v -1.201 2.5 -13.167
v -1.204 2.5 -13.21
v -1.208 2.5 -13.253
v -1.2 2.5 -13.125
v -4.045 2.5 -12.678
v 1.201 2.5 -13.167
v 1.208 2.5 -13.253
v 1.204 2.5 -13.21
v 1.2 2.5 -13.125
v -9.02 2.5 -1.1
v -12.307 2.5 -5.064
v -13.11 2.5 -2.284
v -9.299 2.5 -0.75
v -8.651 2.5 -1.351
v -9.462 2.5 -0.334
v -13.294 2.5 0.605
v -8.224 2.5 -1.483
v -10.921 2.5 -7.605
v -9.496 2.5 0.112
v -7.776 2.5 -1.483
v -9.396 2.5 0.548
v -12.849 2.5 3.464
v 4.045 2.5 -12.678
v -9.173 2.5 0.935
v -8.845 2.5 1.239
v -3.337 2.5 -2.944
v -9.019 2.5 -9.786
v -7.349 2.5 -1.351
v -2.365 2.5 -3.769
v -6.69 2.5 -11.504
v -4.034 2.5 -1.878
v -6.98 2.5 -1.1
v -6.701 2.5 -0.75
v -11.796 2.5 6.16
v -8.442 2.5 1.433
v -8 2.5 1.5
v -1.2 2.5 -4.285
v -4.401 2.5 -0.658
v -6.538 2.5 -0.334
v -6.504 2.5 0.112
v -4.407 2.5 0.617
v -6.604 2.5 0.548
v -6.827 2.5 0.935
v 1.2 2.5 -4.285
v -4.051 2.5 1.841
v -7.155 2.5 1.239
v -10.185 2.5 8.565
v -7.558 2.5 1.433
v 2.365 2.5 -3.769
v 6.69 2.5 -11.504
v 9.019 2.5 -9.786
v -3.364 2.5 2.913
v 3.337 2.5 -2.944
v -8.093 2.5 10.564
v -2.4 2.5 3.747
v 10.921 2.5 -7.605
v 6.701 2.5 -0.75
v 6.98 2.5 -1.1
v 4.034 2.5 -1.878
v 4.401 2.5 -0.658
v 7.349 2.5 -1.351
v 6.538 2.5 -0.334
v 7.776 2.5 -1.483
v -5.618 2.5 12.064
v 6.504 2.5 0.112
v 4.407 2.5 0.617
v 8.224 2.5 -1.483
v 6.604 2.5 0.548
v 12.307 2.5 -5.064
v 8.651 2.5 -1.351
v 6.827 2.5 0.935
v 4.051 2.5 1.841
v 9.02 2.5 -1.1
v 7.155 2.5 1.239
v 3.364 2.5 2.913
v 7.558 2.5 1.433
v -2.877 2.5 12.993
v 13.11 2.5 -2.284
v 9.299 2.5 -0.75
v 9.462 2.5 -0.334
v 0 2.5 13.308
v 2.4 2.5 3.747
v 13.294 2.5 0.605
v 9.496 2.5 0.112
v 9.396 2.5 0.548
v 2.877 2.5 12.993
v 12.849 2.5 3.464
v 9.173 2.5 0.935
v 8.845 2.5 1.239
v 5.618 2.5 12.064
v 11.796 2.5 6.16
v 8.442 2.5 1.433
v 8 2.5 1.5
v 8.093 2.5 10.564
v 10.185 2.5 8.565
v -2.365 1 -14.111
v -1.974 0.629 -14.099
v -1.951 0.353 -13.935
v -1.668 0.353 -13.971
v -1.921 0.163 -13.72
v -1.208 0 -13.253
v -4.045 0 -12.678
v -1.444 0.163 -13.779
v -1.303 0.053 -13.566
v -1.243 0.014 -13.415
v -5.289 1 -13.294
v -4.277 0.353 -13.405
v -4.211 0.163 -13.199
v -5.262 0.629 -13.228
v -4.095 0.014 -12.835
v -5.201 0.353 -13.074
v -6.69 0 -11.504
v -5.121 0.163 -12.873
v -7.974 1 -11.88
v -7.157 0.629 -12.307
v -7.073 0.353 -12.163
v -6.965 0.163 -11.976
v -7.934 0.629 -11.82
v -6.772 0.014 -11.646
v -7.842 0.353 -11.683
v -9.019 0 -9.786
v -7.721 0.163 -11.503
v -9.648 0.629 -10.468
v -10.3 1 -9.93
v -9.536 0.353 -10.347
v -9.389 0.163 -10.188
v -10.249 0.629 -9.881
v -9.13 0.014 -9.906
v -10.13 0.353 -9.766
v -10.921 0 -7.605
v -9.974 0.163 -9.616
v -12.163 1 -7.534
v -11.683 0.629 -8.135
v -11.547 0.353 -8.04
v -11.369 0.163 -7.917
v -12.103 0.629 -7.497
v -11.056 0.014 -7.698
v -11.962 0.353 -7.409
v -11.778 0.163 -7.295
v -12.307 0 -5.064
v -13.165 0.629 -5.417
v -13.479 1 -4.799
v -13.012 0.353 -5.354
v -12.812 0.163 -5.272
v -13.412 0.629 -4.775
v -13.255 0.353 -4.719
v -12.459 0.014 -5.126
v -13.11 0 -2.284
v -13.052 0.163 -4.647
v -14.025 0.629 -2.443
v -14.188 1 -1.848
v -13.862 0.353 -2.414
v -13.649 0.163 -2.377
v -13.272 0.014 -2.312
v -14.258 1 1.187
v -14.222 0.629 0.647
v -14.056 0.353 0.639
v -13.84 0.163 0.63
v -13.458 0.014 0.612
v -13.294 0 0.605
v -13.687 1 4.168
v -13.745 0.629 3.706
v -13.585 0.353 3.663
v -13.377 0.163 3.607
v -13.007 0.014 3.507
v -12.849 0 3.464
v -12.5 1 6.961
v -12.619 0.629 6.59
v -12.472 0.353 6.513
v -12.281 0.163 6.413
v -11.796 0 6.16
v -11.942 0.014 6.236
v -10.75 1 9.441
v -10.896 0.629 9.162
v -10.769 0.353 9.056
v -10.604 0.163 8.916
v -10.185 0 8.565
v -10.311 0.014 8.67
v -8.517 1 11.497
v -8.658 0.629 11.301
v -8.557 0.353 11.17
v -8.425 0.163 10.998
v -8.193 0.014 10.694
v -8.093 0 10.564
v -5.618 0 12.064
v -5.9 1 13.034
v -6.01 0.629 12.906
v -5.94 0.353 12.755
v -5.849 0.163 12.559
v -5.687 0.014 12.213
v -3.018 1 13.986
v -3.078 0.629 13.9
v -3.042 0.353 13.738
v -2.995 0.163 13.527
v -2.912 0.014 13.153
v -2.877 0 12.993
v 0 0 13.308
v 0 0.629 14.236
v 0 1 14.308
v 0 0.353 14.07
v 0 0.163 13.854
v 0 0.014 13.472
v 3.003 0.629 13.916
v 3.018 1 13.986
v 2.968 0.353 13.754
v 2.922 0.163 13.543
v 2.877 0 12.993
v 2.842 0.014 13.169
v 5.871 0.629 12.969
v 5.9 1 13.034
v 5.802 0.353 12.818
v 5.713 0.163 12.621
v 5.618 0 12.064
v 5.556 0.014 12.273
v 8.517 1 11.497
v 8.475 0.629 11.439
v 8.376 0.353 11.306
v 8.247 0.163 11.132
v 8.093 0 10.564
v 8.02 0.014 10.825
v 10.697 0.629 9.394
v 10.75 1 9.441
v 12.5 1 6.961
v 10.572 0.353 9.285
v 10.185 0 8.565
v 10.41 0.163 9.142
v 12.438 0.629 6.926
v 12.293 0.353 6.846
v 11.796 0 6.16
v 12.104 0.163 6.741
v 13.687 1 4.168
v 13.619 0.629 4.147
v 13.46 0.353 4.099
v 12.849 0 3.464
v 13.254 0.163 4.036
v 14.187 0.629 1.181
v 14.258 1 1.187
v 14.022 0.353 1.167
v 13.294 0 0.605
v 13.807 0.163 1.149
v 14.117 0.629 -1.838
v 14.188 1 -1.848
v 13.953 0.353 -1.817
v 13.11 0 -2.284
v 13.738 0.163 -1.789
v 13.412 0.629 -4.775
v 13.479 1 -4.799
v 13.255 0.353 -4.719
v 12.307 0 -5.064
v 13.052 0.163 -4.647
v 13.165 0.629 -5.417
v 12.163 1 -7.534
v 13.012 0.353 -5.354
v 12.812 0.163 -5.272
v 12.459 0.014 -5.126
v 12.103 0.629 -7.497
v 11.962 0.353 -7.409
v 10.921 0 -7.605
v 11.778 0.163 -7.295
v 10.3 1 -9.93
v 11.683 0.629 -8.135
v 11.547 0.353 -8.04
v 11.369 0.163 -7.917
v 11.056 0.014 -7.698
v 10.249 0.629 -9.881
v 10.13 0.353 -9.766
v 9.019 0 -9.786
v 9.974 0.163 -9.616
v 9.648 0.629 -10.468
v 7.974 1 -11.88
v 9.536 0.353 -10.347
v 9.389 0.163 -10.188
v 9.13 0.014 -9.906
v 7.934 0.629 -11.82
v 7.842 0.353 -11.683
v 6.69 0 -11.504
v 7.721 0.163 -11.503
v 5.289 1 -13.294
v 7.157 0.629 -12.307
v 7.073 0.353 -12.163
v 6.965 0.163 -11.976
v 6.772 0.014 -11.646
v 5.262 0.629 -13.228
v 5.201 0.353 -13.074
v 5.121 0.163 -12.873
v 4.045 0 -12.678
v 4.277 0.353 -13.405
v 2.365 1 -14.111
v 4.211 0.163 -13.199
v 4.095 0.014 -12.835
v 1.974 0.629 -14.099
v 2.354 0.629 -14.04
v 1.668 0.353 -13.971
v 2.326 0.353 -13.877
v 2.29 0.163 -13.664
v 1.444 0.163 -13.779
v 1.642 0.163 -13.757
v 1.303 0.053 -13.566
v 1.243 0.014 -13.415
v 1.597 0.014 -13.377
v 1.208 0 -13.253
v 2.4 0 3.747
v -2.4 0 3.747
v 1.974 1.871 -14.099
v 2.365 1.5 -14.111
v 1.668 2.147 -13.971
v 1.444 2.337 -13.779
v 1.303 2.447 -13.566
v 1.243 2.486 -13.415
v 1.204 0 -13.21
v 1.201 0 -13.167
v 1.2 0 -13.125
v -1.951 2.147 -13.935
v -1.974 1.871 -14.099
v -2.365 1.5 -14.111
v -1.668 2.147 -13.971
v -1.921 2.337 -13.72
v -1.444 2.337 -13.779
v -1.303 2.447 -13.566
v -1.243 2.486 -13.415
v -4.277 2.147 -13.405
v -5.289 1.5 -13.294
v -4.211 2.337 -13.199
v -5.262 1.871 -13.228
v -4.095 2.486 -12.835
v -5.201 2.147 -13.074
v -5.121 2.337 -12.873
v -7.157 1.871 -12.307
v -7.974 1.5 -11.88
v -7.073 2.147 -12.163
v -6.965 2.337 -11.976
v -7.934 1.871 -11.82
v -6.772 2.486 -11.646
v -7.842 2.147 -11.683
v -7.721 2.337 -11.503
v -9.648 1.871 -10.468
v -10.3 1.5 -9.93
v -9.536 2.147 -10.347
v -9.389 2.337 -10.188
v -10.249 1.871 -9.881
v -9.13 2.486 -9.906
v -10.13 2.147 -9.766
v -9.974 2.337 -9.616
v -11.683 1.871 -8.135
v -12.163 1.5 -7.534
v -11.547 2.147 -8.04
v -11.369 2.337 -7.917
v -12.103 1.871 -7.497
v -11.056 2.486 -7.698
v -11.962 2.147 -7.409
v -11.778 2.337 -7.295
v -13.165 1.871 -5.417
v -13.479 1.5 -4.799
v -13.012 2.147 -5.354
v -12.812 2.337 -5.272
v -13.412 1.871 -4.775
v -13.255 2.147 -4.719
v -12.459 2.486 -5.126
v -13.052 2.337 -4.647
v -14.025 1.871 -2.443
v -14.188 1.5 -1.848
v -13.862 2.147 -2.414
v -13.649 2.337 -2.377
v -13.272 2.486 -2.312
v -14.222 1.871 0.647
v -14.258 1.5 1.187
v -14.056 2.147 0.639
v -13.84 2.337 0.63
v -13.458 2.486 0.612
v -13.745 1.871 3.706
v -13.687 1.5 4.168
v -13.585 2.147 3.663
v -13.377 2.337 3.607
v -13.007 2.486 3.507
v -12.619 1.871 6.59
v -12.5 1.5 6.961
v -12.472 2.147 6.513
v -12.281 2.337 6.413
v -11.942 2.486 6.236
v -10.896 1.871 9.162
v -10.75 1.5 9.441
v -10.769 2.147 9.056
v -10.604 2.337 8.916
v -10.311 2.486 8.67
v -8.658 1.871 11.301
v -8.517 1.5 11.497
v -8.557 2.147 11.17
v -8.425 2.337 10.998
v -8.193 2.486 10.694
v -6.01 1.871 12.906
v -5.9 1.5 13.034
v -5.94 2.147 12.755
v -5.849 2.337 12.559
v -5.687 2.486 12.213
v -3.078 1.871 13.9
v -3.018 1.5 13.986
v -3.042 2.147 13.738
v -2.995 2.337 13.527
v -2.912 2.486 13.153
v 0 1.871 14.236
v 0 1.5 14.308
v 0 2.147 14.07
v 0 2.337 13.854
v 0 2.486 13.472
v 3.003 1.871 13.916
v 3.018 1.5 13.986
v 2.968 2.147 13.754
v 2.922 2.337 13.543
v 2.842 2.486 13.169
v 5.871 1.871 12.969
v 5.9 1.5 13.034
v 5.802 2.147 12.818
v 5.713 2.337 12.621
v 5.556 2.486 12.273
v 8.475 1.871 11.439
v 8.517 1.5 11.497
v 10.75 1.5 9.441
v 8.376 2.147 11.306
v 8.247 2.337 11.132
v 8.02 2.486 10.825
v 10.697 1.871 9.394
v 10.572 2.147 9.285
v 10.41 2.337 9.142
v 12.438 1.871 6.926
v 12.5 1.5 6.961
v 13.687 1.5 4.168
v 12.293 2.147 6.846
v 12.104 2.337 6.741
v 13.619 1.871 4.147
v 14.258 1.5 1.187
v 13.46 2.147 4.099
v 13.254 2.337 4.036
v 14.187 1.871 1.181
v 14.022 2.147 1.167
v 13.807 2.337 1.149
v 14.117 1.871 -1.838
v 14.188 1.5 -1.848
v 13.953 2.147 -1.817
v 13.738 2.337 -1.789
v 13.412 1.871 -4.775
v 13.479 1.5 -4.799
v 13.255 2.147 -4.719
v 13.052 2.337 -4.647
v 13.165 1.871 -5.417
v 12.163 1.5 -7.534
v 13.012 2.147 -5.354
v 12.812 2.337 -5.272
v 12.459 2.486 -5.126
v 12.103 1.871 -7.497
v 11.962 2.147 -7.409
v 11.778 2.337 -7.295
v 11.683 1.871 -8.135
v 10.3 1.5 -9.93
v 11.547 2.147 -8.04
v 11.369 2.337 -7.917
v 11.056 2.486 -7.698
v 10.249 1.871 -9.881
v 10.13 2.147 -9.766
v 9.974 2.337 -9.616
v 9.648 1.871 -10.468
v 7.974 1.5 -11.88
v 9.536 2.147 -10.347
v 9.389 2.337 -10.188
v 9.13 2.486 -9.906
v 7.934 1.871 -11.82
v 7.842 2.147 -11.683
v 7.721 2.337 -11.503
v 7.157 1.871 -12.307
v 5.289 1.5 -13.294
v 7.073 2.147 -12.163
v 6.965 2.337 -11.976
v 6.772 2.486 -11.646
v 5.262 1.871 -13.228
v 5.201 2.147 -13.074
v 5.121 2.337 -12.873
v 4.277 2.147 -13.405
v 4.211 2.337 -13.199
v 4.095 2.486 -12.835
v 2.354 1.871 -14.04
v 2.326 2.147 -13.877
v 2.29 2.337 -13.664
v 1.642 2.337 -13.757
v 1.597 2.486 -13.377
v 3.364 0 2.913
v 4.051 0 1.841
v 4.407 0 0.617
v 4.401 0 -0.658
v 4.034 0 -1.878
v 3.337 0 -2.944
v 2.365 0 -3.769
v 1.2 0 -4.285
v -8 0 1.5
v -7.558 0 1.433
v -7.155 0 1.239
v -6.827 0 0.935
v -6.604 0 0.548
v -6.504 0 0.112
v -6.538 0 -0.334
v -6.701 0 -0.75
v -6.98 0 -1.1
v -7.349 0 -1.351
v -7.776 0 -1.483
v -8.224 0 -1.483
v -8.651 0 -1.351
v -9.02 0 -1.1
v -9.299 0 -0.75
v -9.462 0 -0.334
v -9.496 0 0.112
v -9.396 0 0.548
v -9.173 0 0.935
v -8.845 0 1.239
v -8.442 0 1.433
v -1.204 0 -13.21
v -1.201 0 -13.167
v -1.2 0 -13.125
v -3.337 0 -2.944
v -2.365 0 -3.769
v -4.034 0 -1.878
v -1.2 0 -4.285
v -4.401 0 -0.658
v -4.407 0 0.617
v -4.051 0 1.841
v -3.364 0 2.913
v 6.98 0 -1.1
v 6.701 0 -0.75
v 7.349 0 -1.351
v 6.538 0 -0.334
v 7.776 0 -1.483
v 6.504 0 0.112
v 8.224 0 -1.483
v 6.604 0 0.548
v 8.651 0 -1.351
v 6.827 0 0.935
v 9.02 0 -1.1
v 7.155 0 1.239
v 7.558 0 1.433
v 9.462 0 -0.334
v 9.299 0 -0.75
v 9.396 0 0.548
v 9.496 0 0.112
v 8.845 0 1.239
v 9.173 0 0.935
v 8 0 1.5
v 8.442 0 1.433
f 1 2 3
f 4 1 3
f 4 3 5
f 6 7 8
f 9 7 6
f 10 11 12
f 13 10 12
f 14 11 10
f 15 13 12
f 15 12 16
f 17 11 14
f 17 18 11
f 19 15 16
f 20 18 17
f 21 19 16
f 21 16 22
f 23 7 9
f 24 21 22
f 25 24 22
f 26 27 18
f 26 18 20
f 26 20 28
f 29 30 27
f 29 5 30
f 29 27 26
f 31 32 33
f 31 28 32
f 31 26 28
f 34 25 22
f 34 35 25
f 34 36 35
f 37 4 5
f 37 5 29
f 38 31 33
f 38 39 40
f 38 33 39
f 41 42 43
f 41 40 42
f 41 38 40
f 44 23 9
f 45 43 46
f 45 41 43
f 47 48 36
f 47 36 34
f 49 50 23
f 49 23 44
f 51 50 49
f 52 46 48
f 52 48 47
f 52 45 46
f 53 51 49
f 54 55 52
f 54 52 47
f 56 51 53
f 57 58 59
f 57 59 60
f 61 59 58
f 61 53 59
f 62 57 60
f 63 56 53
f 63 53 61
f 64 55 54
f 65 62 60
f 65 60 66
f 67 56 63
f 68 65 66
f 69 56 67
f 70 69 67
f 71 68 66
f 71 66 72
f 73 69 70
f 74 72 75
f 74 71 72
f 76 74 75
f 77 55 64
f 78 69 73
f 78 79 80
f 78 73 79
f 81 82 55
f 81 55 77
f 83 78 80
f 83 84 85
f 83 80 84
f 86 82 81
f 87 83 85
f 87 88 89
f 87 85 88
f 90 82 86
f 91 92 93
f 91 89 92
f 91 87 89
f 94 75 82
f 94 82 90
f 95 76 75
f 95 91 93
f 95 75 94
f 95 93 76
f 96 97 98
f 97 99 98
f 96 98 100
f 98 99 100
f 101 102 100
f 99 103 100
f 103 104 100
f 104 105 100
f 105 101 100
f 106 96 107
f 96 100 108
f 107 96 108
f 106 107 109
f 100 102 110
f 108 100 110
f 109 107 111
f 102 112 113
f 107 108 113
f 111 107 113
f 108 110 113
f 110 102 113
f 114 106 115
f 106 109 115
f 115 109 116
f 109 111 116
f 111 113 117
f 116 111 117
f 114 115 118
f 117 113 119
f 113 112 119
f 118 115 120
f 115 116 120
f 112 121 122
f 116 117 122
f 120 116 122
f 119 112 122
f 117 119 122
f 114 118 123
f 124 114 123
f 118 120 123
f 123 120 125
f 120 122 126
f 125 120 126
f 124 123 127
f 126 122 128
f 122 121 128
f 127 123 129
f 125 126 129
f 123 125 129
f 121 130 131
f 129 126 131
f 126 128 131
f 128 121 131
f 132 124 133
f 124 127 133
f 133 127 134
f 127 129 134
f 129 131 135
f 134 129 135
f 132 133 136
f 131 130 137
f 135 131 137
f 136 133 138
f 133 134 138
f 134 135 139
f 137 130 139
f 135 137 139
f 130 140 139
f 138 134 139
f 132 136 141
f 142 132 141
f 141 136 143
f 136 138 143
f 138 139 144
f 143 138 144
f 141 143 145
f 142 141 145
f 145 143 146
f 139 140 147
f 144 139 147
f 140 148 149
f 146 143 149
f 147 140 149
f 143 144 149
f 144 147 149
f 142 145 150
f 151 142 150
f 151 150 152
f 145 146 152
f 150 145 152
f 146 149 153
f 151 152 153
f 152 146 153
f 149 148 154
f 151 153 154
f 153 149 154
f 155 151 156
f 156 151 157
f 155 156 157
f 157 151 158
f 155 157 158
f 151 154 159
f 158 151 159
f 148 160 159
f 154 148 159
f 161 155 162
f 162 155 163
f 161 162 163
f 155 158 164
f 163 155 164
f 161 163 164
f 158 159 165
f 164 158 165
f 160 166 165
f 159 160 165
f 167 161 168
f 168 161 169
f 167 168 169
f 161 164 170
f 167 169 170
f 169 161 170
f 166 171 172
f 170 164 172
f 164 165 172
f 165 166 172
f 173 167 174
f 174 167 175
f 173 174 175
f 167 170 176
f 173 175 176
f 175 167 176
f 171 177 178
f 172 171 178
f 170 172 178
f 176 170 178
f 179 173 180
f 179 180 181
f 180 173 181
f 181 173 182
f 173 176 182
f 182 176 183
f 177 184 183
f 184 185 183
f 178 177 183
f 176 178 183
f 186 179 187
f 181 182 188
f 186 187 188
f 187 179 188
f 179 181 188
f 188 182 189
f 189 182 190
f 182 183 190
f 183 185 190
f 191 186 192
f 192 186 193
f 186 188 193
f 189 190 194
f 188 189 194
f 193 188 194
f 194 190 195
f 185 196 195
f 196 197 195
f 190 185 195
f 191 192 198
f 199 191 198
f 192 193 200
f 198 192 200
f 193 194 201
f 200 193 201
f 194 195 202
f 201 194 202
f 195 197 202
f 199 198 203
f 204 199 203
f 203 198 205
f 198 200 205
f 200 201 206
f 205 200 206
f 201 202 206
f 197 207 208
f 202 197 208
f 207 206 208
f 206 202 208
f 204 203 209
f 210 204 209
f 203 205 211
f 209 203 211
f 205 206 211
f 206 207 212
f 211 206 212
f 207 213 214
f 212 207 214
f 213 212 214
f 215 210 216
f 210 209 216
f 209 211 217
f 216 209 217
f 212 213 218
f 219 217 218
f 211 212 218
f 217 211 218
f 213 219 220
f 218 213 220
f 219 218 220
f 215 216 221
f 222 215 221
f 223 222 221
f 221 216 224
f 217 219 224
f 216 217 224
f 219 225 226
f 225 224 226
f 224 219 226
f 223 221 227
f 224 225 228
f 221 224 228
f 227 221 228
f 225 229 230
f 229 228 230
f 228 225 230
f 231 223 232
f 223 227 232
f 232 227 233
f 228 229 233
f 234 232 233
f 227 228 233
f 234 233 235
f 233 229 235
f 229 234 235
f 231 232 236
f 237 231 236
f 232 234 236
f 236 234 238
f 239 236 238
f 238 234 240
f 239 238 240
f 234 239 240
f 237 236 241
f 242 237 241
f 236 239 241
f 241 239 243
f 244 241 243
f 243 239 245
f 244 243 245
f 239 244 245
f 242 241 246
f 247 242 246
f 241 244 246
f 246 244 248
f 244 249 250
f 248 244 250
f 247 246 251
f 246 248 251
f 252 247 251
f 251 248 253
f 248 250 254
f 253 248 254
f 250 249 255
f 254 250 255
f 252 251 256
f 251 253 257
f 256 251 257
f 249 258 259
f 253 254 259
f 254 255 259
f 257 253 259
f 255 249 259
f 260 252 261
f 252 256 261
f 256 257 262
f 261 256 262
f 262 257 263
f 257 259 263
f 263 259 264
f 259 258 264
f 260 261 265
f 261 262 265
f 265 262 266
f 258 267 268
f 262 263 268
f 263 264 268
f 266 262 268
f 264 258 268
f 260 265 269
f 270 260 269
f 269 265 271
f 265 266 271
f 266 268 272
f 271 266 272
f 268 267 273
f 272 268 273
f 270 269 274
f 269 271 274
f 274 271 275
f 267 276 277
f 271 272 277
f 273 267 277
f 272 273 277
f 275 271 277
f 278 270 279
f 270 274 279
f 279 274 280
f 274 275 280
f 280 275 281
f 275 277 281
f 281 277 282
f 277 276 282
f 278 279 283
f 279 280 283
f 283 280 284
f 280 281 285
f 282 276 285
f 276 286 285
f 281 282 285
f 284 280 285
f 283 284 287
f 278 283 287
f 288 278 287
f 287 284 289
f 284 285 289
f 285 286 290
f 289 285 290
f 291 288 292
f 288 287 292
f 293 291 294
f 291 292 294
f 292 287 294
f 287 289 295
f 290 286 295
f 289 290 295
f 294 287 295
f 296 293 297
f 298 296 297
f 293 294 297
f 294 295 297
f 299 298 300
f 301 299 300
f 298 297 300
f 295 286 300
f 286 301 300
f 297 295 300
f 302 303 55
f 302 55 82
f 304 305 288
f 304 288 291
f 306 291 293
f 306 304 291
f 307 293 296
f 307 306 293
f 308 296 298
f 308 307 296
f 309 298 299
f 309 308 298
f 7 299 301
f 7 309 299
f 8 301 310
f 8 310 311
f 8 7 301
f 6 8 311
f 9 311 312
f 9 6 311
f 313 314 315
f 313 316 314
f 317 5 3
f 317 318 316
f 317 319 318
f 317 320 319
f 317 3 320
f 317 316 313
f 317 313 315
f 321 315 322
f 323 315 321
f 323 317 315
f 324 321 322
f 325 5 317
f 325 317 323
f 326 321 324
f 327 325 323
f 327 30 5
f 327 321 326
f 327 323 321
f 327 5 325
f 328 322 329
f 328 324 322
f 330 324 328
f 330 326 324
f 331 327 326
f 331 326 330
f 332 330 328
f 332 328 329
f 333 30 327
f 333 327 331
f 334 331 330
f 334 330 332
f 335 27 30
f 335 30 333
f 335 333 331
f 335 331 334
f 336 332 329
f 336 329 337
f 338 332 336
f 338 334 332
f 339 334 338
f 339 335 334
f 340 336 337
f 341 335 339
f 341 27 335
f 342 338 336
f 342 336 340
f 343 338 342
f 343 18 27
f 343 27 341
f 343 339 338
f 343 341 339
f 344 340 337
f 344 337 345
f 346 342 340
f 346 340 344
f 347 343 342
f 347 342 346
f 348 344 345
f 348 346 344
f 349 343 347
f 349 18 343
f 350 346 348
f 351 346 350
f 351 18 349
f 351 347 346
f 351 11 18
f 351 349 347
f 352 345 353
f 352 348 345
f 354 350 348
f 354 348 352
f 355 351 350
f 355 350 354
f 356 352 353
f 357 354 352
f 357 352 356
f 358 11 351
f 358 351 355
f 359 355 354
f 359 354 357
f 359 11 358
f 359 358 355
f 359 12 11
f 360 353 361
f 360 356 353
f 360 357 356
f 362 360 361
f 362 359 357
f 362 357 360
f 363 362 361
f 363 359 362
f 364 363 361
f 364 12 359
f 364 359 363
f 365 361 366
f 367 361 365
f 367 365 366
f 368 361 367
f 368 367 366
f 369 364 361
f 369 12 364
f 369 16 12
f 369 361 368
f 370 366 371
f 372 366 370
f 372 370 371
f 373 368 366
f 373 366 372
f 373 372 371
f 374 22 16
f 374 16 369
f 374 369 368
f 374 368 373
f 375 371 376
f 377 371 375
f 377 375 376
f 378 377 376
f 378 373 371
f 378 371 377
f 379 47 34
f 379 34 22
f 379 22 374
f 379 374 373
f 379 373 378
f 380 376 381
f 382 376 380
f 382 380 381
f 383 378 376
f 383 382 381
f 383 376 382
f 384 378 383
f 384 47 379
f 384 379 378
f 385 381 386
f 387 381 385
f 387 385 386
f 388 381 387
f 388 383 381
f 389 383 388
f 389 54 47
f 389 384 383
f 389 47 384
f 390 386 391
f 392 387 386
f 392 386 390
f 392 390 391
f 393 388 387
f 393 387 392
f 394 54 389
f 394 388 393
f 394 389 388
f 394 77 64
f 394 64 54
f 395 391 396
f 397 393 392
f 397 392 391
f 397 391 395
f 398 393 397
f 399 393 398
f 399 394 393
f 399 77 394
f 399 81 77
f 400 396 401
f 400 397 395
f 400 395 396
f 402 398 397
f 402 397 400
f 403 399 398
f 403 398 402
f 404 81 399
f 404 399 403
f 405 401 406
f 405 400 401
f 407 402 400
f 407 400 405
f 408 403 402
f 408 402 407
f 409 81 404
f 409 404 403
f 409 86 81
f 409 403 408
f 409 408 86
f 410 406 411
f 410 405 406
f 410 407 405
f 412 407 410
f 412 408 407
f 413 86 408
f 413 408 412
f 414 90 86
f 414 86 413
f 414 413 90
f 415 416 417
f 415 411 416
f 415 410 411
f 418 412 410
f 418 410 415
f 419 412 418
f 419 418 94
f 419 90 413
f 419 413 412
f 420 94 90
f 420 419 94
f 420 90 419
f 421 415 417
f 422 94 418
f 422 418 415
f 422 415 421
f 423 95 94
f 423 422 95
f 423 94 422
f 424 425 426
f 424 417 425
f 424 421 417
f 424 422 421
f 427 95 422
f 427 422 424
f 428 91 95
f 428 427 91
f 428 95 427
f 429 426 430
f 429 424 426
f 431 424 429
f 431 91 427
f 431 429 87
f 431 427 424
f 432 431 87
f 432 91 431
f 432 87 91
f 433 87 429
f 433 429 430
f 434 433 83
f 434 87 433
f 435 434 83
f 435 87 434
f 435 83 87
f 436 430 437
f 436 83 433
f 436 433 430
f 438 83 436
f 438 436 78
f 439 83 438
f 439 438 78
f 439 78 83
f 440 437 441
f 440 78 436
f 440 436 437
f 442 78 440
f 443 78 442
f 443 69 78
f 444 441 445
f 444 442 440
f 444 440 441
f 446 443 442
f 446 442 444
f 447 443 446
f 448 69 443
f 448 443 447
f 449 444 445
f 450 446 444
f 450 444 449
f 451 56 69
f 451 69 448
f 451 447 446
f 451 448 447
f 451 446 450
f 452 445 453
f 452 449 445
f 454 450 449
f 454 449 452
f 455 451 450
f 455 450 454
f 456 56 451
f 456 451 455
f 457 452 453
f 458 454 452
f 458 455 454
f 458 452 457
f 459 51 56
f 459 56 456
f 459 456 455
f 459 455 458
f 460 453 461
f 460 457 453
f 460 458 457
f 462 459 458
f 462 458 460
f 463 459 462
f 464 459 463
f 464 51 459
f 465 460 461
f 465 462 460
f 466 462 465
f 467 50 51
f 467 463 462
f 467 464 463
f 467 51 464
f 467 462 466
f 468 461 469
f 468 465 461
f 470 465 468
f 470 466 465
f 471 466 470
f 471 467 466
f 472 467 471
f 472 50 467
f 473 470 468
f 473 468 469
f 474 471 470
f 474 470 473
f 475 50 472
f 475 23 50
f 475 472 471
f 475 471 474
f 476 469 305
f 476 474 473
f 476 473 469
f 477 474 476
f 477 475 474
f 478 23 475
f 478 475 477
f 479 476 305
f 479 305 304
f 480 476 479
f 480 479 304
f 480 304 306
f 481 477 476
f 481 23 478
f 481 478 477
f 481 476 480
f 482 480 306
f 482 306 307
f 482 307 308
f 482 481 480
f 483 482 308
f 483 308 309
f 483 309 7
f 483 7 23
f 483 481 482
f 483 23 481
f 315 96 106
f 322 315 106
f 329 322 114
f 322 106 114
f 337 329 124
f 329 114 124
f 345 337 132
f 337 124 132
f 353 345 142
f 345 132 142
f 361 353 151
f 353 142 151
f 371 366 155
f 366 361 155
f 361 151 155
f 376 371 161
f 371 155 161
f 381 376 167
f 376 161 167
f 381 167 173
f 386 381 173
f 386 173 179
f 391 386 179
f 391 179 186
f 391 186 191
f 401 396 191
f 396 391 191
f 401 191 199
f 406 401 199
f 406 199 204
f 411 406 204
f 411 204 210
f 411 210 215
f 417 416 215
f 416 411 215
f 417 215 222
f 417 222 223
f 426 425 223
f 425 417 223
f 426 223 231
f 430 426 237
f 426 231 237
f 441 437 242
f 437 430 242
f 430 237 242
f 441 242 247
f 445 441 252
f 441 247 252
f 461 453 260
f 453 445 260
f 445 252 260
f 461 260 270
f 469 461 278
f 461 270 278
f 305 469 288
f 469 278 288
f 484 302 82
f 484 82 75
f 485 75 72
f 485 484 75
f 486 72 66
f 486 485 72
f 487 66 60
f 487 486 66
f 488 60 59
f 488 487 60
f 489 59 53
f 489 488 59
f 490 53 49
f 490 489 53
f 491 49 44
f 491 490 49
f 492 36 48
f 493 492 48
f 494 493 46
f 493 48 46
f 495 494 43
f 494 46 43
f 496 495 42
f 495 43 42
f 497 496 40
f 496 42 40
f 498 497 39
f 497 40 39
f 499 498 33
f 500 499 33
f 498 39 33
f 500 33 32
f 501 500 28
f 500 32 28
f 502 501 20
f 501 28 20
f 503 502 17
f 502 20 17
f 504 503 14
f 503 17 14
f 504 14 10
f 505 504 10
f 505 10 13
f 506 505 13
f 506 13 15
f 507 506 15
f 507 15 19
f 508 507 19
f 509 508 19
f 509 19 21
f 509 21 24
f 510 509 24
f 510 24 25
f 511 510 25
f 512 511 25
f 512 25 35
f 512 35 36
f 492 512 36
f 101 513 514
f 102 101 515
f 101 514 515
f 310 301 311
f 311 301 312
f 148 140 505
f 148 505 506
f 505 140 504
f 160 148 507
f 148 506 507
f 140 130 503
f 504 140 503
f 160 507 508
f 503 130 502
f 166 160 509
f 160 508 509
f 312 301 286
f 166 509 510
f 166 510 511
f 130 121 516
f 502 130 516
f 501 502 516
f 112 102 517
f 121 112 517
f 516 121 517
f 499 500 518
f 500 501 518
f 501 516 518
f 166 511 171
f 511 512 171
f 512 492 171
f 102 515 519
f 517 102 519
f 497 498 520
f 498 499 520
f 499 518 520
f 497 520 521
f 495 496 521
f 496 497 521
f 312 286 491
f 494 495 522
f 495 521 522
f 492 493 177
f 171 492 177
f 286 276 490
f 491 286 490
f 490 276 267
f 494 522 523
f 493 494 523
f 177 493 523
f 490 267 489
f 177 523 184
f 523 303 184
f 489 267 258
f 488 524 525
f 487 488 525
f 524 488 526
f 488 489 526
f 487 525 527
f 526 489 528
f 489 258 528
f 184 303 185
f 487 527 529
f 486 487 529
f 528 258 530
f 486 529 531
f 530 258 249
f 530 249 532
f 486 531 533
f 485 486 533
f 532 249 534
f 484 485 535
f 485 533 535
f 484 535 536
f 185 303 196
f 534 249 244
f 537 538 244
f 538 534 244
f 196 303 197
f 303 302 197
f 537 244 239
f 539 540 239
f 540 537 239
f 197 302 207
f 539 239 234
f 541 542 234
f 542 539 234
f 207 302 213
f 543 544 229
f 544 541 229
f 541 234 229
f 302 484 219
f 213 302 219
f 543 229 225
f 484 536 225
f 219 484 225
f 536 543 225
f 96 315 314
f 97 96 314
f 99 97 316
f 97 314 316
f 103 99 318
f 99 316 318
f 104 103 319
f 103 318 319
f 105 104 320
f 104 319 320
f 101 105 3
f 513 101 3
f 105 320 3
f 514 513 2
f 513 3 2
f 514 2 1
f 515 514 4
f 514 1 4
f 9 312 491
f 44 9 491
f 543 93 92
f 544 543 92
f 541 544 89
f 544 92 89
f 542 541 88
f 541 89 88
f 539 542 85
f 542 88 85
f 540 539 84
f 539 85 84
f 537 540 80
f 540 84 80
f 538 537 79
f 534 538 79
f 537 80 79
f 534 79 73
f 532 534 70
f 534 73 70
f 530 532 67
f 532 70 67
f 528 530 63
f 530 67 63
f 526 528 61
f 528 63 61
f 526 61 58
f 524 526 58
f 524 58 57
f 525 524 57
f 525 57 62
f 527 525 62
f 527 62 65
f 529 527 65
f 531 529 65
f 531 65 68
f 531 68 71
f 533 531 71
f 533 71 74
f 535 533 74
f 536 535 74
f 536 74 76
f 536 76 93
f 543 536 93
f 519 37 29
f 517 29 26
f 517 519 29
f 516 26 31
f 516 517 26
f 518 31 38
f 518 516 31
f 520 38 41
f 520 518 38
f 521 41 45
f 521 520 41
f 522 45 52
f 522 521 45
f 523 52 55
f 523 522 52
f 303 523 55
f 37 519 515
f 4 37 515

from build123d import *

# Parameters (mm, degrees)
SKETCH1_R           = 14.307679757
BOSS_EXTRUDE1_DEPTH = 2.5
CUT_EXTRUDE1_DEPTH  = 15
FILLET1_R           = 1
SKETCH6_R           = 1.5
CUT_EXTRUDE2_DEPTH  = 10


with BuildPart() as part:
    # Sketch1 → Boss-Extrude1 (new body)
    with BuildSketch(Plane(origin=(0, 0, 0), x_dir=(1, 0, 0), z_dir=(0, 1, 0))):
        Circle(SKETCH1_R)
        with BuildLine():
            Line((-2.4, -3.747332385), (2.4, -3.747332385))
            ThreePointArc((2.4, -3.747332385), (0, 4.45), (-2.4, -3.747332385))
        make_face(mode=Mode.SUBTRACT)
    extrude(amount=BOSS_EXTRUDE1_DEPTH)

    # Sketch4 → Cut-Extrude1 (cut)
    with BuildSketch(Plane.XZ):
        with BuildLine():
            Line((-1.2, -4.285148772), (-1.2, -14.257268323))
            ThreePointArc((-1.2, -14.257268323), (0, -14.307679757), (1.2, -14.257268323))
            Line((1.2, -14.257268323), (1.2, -4.285148772))
            ThreePointArc((1.2, -4.285148772), (0, -4.45), (-1.2, -4.285148772))
        make_face()
    extrude(amount=-CUT_EXTRUDE1_DEPTH, mode=Mode.SUBTRACT)

    # Fillet1
    fillet1_edges = [part.edges().sort_by_distance(p)[0] for p in [
        (-1.2, 1.25, -14.257268323),
        (0, 2.5, 14.307679757),
        (1.2, 1.25, -14.257268323),
        (0, 0, 14.307679757),
    ]]
    fillet(fillet1_edges, radius=FILLET1_R)

    # Sketch6 → Cut-Extrude2 (cut)
    with BuildSketch(Plane(origin=(0, 2.5, 0), x_dir=(1, 0, 0), z_dir=(0, 1, 0))):
        with Locations((8, 0)):
            Circle(SKETCH6_R)
        with Locations((-8, 0)):
            Circle(SKETCH6_R)
    extrude(amount=-CUT_EXTRUDE2_DEPTH, mode=Mode.SUBTRACT)


solid = part.part
